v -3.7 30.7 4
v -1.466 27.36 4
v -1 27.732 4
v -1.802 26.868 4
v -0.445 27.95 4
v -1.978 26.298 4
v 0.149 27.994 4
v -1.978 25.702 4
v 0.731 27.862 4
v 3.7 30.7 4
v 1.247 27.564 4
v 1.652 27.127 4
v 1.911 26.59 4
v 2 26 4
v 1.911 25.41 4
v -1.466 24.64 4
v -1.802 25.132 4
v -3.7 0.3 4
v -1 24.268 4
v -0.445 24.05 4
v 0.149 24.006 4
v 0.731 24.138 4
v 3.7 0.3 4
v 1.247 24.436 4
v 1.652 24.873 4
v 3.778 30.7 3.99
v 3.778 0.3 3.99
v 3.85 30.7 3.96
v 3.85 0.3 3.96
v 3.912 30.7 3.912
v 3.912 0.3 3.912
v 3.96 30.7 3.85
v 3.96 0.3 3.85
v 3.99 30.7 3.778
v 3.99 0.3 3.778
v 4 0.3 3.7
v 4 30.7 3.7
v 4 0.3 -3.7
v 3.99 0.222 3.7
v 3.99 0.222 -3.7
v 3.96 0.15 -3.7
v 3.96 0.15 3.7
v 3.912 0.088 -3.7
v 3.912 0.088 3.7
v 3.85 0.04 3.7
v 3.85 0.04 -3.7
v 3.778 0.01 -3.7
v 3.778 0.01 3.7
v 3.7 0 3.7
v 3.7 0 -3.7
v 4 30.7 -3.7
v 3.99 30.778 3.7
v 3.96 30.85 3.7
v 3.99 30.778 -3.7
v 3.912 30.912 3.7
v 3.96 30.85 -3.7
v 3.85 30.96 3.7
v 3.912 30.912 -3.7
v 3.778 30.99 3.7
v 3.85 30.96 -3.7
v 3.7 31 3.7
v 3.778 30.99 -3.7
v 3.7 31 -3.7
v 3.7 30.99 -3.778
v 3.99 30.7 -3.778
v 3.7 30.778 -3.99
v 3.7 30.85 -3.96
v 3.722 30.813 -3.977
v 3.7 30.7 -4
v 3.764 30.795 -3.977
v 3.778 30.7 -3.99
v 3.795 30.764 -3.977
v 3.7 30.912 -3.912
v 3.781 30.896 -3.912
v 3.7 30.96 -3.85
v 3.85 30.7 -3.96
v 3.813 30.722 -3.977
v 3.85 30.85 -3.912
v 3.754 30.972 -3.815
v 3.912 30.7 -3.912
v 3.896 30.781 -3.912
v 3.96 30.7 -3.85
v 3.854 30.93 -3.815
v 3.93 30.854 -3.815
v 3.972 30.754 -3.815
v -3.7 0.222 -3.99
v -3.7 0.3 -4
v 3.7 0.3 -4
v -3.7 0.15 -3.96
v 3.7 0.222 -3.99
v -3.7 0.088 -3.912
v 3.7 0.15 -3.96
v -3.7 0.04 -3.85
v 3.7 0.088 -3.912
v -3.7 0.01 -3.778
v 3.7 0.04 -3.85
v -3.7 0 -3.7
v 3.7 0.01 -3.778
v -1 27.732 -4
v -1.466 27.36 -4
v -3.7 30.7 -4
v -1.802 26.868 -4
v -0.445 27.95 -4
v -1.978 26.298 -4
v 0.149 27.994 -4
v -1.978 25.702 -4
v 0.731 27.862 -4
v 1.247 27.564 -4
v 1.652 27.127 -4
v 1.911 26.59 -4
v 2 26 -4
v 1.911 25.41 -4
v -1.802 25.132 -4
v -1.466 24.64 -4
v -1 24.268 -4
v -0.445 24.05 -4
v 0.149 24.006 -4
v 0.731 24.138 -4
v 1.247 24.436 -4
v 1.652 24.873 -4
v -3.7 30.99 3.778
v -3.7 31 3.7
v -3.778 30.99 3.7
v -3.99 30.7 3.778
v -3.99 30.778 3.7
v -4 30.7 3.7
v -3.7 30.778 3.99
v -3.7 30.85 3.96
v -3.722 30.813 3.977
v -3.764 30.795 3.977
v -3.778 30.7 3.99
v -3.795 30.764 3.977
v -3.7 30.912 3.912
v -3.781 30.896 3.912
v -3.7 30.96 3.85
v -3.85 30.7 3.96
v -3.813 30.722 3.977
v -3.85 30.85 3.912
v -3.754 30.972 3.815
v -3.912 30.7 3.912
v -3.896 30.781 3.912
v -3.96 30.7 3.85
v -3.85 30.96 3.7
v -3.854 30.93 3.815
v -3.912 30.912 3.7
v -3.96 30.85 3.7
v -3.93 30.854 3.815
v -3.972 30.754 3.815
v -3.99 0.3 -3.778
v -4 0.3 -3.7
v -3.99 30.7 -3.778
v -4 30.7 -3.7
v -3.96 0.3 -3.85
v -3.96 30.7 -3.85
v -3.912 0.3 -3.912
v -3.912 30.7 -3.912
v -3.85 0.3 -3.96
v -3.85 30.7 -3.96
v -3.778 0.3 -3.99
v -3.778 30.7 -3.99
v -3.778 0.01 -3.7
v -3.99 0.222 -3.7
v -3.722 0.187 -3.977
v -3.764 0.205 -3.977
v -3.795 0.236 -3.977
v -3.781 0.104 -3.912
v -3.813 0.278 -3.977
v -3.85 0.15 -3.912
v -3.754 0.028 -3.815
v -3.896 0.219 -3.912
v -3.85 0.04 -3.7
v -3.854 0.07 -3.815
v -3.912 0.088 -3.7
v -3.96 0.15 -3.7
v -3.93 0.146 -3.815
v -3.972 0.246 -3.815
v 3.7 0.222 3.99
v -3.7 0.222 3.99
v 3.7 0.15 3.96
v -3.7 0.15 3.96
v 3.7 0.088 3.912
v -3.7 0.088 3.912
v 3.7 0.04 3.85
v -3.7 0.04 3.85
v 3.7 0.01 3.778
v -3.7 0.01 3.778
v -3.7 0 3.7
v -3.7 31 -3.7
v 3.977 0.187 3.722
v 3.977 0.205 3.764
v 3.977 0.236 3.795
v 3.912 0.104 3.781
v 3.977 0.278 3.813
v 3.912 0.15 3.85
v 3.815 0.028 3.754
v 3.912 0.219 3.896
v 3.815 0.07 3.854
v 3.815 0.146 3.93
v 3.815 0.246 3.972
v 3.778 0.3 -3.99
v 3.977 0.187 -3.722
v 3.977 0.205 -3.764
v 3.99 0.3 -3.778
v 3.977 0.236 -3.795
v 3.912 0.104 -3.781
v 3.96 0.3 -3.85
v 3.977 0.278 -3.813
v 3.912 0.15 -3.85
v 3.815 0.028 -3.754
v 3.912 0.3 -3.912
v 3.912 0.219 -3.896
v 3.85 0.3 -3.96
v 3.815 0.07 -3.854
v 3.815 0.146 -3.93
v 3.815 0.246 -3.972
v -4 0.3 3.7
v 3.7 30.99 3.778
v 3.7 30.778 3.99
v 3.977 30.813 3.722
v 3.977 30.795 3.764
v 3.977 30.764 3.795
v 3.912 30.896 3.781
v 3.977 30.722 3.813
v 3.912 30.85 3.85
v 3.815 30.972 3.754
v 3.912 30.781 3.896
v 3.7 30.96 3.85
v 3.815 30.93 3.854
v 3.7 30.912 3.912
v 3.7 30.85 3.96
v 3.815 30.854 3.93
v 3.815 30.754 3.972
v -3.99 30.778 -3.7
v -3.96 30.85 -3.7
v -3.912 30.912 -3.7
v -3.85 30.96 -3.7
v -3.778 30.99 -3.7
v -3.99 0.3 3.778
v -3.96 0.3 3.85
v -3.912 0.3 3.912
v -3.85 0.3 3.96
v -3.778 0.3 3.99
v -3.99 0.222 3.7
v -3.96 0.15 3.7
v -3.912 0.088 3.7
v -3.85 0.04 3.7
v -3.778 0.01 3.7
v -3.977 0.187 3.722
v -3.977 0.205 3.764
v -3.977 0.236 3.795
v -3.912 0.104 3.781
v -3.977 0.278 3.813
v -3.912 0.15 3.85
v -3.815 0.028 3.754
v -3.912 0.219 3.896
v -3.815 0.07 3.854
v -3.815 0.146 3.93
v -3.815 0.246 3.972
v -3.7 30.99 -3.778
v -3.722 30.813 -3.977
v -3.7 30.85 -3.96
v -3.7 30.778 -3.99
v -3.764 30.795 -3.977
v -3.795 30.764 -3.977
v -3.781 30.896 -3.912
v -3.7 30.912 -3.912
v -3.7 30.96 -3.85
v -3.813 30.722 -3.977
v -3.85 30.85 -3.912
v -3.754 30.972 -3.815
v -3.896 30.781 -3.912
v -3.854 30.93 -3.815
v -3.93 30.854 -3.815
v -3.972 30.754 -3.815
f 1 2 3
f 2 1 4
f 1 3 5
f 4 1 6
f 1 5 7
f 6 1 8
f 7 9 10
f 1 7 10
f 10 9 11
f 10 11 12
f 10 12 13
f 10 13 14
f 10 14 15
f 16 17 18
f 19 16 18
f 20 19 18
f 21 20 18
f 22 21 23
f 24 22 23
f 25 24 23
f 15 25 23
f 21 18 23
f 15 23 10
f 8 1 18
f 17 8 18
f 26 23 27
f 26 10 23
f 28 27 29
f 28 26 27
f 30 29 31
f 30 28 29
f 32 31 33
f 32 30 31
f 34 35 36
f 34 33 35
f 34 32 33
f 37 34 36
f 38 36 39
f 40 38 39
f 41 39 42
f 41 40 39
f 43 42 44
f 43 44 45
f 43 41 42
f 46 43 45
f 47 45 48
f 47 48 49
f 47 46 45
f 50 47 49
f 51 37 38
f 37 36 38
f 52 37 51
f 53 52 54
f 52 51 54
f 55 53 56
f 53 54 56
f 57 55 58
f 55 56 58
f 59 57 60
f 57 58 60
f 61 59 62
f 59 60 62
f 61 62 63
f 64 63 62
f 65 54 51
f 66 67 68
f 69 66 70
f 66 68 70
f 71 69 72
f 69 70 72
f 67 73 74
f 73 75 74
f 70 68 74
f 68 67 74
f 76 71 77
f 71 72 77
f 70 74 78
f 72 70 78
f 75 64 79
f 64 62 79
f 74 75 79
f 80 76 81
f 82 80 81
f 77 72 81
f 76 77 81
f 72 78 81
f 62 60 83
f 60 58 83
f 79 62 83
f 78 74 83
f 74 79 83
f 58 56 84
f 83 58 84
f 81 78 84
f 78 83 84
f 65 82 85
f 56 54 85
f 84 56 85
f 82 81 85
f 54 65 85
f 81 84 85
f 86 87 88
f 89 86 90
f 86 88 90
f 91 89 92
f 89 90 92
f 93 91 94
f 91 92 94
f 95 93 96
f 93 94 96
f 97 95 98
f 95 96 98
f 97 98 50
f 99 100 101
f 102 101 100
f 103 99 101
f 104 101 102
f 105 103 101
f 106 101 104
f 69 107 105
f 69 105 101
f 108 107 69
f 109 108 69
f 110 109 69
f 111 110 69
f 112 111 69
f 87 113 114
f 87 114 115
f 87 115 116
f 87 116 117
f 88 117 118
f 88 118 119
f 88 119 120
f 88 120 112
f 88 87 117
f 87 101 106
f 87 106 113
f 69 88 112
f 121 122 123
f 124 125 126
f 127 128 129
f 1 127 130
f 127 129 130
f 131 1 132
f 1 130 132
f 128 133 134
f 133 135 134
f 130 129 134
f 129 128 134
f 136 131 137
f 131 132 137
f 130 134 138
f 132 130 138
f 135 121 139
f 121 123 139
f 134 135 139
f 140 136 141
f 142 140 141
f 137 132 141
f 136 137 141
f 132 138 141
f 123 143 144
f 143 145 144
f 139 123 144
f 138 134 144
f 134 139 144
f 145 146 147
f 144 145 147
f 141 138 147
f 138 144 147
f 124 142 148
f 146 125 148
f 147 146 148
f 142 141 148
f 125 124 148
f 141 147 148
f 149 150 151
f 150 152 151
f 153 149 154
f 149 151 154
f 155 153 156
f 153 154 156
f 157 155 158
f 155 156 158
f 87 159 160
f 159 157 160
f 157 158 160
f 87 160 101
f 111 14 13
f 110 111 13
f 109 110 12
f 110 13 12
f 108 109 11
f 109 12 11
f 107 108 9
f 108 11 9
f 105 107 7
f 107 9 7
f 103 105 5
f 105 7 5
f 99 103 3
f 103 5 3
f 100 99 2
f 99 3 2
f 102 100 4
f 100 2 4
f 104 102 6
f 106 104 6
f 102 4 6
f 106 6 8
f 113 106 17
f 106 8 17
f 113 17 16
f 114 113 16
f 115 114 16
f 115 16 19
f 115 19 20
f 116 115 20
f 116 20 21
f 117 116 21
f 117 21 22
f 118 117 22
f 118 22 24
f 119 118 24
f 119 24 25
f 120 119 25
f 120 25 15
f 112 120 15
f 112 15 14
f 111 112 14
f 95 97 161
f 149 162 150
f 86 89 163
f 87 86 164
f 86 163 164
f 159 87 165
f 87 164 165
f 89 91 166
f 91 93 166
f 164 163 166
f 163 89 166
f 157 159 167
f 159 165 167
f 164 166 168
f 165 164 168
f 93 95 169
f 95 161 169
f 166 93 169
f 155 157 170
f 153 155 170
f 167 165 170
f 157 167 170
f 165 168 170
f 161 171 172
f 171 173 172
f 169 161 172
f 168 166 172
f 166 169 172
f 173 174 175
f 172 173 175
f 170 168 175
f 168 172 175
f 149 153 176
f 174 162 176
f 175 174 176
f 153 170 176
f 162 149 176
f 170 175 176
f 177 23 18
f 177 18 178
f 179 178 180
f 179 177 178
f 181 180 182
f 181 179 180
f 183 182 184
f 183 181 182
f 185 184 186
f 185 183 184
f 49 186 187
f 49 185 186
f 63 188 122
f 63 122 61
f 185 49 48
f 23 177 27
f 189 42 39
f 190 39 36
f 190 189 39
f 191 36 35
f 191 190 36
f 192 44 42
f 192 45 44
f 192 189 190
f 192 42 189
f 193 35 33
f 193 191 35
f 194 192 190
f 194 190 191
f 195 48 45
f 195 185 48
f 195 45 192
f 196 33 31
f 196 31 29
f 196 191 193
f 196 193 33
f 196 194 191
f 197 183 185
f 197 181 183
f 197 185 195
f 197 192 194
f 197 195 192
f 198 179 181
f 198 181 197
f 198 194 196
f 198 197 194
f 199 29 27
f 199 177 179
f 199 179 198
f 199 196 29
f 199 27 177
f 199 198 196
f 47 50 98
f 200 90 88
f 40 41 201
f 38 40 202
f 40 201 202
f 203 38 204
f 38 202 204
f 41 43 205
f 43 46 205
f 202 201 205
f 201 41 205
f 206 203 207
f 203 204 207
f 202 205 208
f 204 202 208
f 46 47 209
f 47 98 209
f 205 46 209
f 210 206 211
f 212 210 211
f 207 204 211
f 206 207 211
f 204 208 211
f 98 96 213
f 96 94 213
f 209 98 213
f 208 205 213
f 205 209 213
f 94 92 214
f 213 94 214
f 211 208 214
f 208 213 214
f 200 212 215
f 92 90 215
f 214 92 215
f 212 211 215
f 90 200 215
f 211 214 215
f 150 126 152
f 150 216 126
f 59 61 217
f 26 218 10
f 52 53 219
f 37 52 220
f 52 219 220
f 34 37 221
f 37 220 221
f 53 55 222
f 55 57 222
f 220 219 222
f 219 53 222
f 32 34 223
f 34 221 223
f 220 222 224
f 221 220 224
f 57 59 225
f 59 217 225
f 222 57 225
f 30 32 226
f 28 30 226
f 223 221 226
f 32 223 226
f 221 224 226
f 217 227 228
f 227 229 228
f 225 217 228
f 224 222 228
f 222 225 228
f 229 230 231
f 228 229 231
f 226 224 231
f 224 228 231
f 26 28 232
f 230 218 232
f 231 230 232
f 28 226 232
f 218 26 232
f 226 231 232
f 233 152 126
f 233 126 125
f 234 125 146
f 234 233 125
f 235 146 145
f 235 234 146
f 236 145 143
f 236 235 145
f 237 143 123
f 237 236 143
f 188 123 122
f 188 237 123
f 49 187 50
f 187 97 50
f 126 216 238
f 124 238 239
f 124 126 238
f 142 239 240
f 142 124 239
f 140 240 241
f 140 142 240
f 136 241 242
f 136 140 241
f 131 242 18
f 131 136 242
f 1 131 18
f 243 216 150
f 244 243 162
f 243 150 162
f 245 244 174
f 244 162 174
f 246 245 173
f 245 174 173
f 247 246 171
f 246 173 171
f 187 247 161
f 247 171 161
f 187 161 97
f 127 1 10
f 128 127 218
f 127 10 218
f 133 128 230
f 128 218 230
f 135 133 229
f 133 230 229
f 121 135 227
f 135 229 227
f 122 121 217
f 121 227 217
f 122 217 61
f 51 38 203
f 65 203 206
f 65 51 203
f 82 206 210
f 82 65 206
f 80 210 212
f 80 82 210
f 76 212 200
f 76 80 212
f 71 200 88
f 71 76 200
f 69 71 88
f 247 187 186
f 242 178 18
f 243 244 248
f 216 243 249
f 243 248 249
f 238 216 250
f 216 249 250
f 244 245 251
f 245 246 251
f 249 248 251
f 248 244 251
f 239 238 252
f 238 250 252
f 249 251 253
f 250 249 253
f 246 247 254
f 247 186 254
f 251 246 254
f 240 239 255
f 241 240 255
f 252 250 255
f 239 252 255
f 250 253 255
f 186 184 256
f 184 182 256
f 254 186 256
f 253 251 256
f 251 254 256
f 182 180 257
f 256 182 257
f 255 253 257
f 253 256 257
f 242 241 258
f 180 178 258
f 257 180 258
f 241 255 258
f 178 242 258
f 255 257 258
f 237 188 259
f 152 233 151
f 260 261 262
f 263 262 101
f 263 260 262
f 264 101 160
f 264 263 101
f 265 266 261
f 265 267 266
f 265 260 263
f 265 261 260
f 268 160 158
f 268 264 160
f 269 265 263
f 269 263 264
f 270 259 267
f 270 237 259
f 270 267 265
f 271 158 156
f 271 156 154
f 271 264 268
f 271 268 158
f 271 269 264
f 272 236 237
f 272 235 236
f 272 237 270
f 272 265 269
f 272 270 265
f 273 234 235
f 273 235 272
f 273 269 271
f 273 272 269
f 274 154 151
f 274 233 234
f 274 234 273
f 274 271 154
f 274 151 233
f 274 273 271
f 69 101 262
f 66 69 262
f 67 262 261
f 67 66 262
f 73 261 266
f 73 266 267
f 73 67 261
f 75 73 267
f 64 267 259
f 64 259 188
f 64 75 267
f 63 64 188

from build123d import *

# Parameters (mm, degrees)
SKIZZE1_W                       = 8
SKIZZE1_H                       = 8
AUFSATZ_LINEAR_AUSTRAGEN1_DEPTH = 31
VERRUNDUNG1_R                   = 0.3
SKIZZE2_R                       = 2
SCHNITT_LINEAR_AUSTRAGEN1_DEPTH = 9


with BuildPart() as part:
    # Skizze1 → Aufsatz-Linear austragen1 (new body)
    with BuildSketch(Plane(origin=(0, 0, 0), x_dir=(1, 0, 0), z_dir=(0, 1, 0))):
        Rectangle(SKIZZE1_W, SKIZZE1_H)
    extrude(amount=AUFSATZ_LINEAR_AUSTRAGEN1_DEPTH)

    # Verrundung1
    verrundung1_edges = [part.edges().sort_by_distance(p)[0] for p in [
        (-4, 31, 0),
        (0, 31, 4),
        (4, 31, 0),
        (0, 0, 4),
        (-4, 0, 0),
        (0, 0, -4),
        (4, 0, 0),
        (0, 31, -4),
        (4, 15.5, 4),
        (-4, 15.5, 4),
        (-4, 15.5, -4),
        (4, 15.5, -4),
    ]]
    fillet(verrundung1_edges, radius=VERRUNDUNG1_R)

    # Skizze2 → Schnitt-Linear austragen1 (cut, through all)
    with BuildSketch(Plane.XY.offset(4)):
        with Locations((0, 26)):
            Circle(SKIZZE2_R)
    extrude(amount=-SCHNITT_LINEAR_AUSTRAGEN1_DEPTH, mode=Mode.SUBTRACT)


solid = part.part
